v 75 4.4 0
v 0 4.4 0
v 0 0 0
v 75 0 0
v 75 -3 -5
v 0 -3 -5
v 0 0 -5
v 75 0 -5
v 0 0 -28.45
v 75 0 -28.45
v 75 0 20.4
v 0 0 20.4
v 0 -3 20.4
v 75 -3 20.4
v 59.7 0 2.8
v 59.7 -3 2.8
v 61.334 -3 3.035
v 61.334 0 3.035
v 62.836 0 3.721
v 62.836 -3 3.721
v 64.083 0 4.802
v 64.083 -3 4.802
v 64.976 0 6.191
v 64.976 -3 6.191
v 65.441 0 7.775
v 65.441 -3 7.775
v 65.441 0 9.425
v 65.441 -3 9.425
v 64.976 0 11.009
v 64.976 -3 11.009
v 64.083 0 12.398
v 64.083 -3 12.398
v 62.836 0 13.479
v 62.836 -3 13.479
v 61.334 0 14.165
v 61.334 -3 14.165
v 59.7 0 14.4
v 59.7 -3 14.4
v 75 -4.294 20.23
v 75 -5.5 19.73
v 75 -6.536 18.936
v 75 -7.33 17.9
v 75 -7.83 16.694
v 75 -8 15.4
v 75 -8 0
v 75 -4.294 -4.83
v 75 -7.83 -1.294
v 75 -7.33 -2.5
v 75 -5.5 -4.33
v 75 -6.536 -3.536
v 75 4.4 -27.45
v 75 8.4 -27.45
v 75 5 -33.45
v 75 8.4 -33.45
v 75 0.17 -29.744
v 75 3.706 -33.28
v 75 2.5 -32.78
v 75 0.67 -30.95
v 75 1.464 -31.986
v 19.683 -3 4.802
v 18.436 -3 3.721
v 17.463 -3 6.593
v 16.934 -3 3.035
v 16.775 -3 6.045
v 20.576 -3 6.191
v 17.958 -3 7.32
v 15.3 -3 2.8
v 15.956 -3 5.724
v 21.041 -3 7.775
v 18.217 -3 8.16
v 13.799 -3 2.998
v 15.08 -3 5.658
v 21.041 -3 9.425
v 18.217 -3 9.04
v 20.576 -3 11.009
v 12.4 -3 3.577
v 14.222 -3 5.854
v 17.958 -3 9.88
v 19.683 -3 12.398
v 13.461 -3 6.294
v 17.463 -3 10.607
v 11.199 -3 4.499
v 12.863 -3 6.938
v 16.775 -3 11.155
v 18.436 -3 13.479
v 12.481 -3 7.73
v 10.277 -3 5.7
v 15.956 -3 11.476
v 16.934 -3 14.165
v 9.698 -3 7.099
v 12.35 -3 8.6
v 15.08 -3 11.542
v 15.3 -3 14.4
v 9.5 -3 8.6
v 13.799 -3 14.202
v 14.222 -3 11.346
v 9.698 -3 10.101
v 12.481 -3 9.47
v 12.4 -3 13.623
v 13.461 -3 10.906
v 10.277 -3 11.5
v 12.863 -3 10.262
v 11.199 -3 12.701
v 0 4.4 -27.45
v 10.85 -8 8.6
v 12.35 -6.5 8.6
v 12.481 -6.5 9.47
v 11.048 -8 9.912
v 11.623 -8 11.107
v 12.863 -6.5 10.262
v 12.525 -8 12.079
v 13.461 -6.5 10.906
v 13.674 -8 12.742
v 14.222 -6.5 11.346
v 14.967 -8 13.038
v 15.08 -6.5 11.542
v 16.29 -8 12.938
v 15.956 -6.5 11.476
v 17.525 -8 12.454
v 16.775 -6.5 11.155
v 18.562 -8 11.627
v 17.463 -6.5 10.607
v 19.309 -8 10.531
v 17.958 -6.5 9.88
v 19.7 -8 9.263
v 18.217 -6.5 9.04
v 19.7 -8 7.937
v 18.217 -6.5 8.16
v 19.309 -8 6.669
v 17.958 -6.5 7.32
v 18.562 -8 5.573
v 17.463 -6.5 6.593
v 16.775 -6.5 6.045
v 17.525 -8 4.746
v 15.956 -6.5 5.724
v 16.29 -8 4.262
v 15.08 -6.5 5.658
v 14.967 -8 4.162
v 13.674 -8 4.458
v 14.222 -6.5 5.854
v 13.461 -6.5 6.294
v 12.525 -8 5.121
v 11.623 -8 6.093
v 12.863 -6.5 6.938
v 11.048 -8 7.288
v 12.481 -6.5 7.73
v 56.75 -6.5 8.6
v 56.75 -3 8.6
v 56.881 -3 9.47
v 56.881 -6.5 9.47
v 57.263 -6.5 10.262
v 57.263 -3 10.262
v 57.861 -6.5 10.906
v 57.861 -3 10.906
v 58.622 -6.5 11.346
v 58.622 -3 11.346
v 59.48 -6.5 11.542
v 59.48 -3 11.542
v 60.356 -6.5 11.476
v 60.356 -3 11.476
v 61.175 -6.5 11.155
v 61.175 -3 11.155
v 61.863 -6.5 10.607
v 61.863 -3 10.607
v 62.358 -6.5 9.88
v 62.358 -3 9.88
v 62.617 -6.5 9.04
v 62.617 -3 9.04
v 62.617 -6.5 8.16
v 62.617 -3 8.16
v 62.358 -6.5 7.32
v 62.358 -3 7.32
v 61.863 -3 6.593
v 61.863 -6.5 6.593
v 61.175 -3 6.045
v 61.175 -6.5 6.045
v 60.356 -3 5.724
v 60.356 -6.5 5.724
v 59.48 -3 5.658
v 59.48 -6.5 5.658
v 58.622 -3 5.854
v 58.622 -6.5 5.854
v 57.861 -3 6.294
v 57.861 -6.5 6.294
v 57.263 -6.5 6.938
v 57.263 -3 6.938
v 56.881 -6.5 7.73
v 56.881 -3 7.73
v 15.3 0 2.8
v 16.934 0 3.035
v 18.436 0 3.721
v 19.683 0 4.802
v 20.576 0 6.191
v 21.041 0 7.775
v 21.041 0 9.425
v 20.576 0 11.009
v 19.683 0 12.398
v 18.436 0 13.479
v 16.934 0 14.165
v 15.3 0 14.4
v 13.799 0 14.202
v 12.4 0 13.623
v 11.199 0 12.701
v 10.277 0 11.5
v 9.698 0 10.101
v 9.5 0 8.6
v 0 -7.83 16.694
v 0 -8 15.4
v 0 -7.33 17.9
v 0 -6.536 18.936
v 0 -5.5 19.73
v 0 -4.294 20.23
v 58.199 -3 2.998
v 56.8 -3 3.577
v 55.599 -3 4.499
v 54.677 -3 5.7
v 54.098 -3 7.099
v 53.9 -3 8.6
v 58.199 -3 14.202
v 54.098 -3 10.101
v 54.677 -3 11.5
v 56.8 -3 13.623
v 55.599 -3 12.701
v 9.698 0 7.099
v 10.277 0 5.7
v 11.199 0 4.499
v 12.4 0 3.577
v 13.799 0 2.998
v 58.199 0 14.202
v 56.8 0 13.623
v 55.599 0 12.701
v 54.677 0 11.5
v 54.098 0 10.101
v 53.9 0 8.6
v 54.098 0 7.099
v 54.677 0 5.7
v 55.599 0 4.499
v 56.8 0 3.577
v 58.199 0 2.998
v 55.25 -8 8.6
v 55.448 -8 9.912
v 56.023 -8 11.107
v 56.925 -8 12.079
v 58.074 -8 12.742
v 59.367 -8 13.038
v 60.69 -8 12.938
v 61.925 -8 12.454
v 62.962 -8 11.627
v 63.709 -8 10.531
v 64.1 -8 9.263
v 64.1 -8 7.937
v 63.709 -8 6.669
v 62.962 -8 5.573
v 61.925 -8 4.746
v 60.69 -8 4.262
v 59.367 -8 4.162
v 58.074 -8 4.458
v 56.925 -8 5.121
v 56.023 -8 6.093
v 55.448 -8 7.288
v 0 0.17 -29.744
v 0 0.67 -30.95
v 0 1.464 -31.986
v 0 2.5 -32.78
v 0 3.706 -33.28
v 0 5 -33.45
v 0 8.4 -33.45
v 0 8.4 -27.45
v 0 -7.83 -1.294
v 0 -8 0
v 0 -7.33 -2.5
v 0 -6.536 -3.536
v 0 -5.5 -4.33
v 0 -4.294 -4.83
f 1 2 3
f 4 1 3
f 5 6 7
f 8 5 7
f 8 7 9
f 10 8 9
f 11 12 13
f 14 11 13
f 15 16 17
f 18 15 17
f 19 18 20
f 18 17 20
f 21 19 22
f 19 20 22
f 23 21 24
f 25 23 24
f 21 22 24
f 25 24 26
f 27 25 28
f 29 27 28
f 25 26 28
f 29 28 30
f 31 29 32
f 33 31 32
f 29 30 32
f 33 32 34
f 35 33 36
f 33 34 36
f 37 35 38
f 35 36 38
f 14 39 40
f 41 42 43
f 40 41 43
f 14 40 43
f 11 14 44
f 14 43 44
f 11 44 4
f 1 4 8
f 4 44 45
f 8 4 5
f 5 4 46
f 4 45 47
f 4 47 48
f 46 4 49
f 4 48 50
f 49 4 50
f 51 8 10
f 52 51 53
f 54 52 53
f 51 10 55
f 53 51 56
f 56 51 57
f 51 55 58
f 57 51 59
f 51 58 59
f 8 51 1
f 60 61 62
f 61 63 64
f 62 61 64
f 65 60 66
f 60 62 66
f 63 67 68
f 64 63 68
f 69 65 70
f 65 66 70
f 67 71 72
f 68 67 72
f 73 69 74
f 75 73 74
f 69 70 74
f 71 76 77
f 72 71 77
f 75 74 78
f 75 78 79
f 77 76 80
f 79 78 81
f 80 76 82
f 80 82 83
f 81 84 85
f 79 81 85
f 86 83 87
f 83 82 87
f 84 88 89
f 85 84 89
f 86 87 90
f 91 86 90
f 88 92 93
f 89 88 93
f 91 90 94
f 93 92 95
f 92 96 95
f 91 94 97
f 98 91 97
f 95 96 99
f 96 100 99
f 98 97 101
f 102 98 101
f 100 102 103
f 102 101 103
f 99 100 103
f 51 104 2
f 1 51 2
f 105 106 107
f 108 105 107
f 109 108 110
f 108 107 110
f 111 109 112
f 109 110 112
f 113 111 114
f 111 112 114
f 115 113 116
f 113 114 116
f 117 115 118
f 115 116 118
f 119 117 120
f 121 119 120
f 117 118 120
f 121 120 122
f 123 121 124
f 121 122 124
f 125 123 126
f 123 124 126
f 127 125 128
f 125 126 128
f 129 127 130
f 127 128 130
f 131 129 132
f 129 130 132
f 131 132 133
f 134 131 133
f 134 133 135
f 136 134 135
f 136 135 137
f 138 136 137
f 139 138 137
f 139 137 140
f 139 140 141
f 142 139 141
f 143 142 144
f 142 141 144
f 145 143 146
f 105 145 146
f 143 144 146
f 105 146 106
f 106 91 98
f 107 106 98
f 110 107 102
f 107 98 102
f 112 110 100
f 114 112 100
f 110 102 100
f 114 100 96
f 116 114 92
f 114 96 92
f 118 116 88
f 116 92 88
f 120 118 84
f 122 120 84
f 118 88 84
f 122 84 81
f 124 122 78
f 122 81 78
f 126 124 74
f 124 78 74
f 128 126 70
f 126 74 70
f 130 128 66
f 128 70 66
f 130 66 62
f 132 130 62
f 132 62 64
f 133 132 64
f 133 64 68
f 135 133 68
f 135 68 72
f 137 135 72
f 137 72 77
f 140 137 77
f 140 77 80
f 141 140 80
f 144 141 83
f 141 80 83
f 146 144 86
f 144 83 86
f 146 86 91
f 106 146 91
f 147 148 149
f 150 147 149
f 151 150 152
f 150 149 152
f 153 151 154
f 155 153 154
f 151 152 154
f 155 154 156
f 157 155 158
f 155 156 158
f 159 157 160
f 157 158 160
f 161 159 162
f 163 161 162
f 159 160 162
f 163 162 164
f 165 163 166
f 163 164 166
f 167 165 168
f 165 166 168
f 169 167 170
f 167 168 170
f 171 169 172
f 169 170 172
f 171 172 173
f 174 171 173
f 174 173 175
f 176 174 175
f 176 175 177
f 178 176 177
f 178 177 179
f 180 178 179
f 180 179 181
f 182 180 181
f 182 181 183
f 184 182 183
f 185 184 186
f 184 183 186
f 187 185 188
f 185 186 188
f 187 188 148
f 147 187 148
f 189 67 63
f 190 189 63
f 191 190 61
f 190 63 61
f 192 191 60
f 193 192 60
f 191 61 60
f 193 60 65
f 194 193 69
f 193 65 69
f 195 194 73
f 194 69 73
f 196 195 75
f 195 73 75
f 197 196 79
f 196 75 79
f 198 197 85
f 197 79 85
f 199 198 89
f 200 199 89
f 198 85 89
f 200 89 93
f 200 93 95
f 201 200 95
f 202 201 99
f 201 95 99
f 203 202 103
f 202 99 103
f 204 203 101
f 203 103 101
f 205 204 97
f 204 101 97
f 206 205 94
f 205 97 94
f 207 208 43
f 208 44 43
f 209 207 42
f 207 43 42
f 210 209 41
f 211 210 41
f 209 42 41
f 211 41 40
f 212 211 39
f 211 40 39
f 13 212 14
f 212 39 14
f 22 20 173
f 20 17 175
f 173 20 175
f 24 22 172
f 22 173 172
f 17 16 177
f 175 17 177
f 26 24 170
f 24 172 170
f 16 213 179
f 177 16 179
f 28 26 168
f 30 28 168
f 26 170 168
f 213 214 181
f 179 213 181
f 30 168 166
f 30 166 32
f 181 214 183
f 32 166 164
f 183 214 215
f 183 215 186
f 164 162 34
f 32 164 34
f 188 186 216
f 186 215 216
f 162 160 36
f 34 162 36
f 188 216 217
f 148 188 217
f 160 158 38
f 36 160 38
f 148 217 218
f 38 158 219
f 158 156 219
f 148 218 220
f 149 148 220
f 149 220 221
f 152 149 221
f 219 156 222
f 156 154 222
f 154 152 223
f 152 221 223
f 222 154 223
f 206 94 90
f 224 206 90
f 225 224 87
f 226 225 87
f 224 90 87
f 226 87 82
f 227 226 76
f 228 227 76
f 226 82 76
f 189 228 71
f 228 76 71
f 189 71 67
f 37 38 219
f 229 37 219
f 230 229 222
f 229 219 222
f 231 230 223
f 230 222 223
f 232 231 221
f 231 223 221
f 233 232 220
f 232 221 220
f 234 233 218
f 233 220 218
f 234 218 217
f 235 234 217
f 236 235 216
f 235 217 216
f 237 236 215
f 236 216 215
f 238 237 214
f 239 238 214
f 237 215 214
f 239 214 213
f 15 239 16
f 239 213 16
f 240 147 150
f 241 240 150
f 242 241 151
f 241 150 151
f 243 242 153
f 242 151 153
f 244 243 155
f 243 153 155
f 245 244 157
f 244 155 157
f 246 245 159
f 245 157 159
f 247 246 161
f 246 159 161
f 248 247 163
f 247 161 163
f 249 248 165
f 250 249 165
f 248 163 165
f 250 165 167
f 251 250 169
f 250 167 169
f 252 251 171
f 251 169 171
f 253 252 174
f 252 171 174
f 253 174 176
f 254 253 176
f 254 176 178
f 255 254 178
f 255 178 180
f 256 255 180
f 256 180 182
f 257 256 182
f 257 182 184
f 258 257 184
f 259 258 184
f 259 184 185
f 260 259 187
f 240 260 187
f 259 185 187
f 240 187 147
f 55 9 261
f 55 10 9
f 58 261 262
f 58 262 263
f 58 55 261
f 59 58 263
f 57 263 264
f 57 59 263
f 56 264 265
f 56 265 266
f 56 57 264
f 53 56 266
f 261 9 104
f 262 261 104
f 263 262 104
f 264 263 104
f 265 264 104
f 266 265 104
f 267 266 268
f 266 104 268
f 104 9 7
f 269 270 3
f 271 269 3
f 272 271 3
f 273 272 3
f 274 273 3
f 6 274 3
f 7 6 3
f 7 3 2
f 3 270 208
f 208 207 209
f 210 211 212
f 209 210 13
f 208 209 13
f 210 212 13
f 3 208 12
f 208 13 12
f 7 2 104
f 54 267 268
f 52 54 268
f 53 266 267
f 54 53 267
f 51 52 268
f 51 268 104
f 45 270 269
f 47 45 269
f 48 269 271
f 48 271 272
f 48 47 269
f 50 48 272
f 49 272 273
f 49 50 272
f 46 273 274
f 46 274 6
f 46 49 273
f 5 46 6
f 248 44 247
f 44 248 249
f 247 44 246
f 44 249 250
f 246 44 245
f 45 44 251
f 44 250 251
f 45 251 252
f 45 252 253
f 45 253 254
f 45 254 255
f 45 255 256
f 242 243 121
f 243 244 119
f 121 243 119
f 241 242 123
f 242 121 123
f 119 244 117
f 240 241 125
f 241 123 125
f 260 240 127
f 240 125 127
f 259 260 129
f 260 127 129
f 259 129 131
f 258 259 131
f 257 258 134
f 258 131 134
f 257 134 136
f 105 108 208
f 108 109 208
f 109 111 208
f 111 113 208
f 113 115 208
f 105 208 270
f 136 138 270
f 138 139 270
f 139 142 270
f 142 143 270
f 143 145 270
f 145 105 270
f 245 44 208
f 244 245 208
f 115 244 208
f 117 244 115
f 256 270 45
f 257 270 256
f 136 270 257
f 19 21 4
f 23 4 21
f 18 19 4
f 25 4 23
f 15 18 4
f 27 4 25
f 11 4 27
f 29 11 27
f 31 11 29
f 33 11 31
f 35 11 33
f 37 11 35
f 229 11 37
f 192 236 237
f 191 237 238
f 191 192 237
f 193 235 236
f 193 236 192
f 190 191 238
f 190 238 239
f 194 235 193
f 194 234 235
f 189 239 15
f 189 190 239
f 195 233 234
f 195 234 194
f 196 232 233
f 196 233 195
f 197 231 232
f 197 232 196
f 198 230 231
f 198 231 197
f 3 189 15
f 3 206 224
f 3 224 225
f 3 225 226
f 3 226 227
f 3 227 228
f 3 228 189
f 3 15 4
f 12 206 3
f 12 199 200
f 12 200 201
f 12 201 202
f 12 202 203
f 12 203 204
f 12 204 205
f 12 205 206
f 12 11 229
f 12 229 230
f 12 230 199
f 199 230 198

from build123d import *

# Parameters (mm, degrees)
F1_DEPTH = 75
F2_R     = 2.95
F3_DEPTH = 5
F4_DEPTH = 3
F5_R     = 5
F6_SIZE  = 1.5


with BuildPart() as f1:
    # F0 (on Right) → F1 (new body)
    with BuildSketch(Plane.YZ):
        Polygon((0, 14.4), (0, 20.4), (-8, 20.4), (-8, -5), (0, -5), (0, -33.45), (8.4, -33.45), (8.4, -27.45), (4.4, -27.45), (4.4, 0), (0, 0), (0, 2.8), (-3, 2.8), (-3, 14.4), align=None)
    extrude(amount=F1_DEPTH)

    # F2 (on face) → F3 (cut, through all)
    with BuildSketch(Plane(origin=(0, -3, 0), x_dir=(-1, 0, 0), z_dir=(0, 1, 0))):
        with Locations((-59.7, 8.6)):
            Circle(F2_R)
        with Locations((-15.3, 8.6)):
            Circle(F2_R)
    extrude(amount=-F3_DEPTH, mode=Mode.SUBTRACT)

    # F2 (on face) → F4 (join, through all)
    with BuildSketch(Plane(origin=(0, -3, 0), x_dir=(-1, 0, 0), z_dir=(0, 1, 0))):
        with BuildLine():
            Line((-75, 2.8), (-59.7, 2.8))
            ThreePointArc((-59.7, 2.8), (-65.5, 8.6), (-59.7, 14.4))
            Line((-59.7, 14.4), (-75, 14.4))
            Line((-75, 14.4), (-75, 2.8))
        make_face()
        with BuildLine():
            Line((-15.3, 2.8), (0, 2.8))
            Line((0, 2.8), (0, 14.4))
            Line((0, 14.4), (-15.3, 14.4))
            ThreePointArc((-15.3, 14.4), (-11.198781, 12.701219), (-9.5, 8.6))
            ThreePointArc((-9.5, 8.6), (-11.198781, 4.498781), (-15.3, 2.8))
        make_face()
        with BuildLine():
            Line((-59.7, 2.8), (-15.3, 2.8))
            ThreePointArc((-15.3, 2.8), (-21.1, 8.6), (-15.3, 14.4))
            Line((-15.3, 14.4), (-59.7, 14.4))
            ThreePointArc((-59.7, 14.4), (-55.598781, 12.701219), (-53.9, 8.6))
            ThreePointArc((-53.9, 8.6), (-55.598781, 4.498781), (-59.7, 2.8))
        make_face()
    extrude(amount=F4_DEPTH)

    # F5
    f5_edges = [f1.edges().sort_by_distance(p)[0] for p in [
        (37.5, -8, 20.4),
        (37.5, -8, -5),
        (37.5, 0, -33.45),
    ]]
    fillet(f5_edges, radius=F5_R)

    # F6
    f6_edges = [f1.edges().sort_by_distance(p)[0] for p in [
        (18.25, -8, 8.6),
        (62.65, -8, 8.6),
    ]]
    chamfer(f6_edges, length=F6_SIZE)


solid = f1.part
